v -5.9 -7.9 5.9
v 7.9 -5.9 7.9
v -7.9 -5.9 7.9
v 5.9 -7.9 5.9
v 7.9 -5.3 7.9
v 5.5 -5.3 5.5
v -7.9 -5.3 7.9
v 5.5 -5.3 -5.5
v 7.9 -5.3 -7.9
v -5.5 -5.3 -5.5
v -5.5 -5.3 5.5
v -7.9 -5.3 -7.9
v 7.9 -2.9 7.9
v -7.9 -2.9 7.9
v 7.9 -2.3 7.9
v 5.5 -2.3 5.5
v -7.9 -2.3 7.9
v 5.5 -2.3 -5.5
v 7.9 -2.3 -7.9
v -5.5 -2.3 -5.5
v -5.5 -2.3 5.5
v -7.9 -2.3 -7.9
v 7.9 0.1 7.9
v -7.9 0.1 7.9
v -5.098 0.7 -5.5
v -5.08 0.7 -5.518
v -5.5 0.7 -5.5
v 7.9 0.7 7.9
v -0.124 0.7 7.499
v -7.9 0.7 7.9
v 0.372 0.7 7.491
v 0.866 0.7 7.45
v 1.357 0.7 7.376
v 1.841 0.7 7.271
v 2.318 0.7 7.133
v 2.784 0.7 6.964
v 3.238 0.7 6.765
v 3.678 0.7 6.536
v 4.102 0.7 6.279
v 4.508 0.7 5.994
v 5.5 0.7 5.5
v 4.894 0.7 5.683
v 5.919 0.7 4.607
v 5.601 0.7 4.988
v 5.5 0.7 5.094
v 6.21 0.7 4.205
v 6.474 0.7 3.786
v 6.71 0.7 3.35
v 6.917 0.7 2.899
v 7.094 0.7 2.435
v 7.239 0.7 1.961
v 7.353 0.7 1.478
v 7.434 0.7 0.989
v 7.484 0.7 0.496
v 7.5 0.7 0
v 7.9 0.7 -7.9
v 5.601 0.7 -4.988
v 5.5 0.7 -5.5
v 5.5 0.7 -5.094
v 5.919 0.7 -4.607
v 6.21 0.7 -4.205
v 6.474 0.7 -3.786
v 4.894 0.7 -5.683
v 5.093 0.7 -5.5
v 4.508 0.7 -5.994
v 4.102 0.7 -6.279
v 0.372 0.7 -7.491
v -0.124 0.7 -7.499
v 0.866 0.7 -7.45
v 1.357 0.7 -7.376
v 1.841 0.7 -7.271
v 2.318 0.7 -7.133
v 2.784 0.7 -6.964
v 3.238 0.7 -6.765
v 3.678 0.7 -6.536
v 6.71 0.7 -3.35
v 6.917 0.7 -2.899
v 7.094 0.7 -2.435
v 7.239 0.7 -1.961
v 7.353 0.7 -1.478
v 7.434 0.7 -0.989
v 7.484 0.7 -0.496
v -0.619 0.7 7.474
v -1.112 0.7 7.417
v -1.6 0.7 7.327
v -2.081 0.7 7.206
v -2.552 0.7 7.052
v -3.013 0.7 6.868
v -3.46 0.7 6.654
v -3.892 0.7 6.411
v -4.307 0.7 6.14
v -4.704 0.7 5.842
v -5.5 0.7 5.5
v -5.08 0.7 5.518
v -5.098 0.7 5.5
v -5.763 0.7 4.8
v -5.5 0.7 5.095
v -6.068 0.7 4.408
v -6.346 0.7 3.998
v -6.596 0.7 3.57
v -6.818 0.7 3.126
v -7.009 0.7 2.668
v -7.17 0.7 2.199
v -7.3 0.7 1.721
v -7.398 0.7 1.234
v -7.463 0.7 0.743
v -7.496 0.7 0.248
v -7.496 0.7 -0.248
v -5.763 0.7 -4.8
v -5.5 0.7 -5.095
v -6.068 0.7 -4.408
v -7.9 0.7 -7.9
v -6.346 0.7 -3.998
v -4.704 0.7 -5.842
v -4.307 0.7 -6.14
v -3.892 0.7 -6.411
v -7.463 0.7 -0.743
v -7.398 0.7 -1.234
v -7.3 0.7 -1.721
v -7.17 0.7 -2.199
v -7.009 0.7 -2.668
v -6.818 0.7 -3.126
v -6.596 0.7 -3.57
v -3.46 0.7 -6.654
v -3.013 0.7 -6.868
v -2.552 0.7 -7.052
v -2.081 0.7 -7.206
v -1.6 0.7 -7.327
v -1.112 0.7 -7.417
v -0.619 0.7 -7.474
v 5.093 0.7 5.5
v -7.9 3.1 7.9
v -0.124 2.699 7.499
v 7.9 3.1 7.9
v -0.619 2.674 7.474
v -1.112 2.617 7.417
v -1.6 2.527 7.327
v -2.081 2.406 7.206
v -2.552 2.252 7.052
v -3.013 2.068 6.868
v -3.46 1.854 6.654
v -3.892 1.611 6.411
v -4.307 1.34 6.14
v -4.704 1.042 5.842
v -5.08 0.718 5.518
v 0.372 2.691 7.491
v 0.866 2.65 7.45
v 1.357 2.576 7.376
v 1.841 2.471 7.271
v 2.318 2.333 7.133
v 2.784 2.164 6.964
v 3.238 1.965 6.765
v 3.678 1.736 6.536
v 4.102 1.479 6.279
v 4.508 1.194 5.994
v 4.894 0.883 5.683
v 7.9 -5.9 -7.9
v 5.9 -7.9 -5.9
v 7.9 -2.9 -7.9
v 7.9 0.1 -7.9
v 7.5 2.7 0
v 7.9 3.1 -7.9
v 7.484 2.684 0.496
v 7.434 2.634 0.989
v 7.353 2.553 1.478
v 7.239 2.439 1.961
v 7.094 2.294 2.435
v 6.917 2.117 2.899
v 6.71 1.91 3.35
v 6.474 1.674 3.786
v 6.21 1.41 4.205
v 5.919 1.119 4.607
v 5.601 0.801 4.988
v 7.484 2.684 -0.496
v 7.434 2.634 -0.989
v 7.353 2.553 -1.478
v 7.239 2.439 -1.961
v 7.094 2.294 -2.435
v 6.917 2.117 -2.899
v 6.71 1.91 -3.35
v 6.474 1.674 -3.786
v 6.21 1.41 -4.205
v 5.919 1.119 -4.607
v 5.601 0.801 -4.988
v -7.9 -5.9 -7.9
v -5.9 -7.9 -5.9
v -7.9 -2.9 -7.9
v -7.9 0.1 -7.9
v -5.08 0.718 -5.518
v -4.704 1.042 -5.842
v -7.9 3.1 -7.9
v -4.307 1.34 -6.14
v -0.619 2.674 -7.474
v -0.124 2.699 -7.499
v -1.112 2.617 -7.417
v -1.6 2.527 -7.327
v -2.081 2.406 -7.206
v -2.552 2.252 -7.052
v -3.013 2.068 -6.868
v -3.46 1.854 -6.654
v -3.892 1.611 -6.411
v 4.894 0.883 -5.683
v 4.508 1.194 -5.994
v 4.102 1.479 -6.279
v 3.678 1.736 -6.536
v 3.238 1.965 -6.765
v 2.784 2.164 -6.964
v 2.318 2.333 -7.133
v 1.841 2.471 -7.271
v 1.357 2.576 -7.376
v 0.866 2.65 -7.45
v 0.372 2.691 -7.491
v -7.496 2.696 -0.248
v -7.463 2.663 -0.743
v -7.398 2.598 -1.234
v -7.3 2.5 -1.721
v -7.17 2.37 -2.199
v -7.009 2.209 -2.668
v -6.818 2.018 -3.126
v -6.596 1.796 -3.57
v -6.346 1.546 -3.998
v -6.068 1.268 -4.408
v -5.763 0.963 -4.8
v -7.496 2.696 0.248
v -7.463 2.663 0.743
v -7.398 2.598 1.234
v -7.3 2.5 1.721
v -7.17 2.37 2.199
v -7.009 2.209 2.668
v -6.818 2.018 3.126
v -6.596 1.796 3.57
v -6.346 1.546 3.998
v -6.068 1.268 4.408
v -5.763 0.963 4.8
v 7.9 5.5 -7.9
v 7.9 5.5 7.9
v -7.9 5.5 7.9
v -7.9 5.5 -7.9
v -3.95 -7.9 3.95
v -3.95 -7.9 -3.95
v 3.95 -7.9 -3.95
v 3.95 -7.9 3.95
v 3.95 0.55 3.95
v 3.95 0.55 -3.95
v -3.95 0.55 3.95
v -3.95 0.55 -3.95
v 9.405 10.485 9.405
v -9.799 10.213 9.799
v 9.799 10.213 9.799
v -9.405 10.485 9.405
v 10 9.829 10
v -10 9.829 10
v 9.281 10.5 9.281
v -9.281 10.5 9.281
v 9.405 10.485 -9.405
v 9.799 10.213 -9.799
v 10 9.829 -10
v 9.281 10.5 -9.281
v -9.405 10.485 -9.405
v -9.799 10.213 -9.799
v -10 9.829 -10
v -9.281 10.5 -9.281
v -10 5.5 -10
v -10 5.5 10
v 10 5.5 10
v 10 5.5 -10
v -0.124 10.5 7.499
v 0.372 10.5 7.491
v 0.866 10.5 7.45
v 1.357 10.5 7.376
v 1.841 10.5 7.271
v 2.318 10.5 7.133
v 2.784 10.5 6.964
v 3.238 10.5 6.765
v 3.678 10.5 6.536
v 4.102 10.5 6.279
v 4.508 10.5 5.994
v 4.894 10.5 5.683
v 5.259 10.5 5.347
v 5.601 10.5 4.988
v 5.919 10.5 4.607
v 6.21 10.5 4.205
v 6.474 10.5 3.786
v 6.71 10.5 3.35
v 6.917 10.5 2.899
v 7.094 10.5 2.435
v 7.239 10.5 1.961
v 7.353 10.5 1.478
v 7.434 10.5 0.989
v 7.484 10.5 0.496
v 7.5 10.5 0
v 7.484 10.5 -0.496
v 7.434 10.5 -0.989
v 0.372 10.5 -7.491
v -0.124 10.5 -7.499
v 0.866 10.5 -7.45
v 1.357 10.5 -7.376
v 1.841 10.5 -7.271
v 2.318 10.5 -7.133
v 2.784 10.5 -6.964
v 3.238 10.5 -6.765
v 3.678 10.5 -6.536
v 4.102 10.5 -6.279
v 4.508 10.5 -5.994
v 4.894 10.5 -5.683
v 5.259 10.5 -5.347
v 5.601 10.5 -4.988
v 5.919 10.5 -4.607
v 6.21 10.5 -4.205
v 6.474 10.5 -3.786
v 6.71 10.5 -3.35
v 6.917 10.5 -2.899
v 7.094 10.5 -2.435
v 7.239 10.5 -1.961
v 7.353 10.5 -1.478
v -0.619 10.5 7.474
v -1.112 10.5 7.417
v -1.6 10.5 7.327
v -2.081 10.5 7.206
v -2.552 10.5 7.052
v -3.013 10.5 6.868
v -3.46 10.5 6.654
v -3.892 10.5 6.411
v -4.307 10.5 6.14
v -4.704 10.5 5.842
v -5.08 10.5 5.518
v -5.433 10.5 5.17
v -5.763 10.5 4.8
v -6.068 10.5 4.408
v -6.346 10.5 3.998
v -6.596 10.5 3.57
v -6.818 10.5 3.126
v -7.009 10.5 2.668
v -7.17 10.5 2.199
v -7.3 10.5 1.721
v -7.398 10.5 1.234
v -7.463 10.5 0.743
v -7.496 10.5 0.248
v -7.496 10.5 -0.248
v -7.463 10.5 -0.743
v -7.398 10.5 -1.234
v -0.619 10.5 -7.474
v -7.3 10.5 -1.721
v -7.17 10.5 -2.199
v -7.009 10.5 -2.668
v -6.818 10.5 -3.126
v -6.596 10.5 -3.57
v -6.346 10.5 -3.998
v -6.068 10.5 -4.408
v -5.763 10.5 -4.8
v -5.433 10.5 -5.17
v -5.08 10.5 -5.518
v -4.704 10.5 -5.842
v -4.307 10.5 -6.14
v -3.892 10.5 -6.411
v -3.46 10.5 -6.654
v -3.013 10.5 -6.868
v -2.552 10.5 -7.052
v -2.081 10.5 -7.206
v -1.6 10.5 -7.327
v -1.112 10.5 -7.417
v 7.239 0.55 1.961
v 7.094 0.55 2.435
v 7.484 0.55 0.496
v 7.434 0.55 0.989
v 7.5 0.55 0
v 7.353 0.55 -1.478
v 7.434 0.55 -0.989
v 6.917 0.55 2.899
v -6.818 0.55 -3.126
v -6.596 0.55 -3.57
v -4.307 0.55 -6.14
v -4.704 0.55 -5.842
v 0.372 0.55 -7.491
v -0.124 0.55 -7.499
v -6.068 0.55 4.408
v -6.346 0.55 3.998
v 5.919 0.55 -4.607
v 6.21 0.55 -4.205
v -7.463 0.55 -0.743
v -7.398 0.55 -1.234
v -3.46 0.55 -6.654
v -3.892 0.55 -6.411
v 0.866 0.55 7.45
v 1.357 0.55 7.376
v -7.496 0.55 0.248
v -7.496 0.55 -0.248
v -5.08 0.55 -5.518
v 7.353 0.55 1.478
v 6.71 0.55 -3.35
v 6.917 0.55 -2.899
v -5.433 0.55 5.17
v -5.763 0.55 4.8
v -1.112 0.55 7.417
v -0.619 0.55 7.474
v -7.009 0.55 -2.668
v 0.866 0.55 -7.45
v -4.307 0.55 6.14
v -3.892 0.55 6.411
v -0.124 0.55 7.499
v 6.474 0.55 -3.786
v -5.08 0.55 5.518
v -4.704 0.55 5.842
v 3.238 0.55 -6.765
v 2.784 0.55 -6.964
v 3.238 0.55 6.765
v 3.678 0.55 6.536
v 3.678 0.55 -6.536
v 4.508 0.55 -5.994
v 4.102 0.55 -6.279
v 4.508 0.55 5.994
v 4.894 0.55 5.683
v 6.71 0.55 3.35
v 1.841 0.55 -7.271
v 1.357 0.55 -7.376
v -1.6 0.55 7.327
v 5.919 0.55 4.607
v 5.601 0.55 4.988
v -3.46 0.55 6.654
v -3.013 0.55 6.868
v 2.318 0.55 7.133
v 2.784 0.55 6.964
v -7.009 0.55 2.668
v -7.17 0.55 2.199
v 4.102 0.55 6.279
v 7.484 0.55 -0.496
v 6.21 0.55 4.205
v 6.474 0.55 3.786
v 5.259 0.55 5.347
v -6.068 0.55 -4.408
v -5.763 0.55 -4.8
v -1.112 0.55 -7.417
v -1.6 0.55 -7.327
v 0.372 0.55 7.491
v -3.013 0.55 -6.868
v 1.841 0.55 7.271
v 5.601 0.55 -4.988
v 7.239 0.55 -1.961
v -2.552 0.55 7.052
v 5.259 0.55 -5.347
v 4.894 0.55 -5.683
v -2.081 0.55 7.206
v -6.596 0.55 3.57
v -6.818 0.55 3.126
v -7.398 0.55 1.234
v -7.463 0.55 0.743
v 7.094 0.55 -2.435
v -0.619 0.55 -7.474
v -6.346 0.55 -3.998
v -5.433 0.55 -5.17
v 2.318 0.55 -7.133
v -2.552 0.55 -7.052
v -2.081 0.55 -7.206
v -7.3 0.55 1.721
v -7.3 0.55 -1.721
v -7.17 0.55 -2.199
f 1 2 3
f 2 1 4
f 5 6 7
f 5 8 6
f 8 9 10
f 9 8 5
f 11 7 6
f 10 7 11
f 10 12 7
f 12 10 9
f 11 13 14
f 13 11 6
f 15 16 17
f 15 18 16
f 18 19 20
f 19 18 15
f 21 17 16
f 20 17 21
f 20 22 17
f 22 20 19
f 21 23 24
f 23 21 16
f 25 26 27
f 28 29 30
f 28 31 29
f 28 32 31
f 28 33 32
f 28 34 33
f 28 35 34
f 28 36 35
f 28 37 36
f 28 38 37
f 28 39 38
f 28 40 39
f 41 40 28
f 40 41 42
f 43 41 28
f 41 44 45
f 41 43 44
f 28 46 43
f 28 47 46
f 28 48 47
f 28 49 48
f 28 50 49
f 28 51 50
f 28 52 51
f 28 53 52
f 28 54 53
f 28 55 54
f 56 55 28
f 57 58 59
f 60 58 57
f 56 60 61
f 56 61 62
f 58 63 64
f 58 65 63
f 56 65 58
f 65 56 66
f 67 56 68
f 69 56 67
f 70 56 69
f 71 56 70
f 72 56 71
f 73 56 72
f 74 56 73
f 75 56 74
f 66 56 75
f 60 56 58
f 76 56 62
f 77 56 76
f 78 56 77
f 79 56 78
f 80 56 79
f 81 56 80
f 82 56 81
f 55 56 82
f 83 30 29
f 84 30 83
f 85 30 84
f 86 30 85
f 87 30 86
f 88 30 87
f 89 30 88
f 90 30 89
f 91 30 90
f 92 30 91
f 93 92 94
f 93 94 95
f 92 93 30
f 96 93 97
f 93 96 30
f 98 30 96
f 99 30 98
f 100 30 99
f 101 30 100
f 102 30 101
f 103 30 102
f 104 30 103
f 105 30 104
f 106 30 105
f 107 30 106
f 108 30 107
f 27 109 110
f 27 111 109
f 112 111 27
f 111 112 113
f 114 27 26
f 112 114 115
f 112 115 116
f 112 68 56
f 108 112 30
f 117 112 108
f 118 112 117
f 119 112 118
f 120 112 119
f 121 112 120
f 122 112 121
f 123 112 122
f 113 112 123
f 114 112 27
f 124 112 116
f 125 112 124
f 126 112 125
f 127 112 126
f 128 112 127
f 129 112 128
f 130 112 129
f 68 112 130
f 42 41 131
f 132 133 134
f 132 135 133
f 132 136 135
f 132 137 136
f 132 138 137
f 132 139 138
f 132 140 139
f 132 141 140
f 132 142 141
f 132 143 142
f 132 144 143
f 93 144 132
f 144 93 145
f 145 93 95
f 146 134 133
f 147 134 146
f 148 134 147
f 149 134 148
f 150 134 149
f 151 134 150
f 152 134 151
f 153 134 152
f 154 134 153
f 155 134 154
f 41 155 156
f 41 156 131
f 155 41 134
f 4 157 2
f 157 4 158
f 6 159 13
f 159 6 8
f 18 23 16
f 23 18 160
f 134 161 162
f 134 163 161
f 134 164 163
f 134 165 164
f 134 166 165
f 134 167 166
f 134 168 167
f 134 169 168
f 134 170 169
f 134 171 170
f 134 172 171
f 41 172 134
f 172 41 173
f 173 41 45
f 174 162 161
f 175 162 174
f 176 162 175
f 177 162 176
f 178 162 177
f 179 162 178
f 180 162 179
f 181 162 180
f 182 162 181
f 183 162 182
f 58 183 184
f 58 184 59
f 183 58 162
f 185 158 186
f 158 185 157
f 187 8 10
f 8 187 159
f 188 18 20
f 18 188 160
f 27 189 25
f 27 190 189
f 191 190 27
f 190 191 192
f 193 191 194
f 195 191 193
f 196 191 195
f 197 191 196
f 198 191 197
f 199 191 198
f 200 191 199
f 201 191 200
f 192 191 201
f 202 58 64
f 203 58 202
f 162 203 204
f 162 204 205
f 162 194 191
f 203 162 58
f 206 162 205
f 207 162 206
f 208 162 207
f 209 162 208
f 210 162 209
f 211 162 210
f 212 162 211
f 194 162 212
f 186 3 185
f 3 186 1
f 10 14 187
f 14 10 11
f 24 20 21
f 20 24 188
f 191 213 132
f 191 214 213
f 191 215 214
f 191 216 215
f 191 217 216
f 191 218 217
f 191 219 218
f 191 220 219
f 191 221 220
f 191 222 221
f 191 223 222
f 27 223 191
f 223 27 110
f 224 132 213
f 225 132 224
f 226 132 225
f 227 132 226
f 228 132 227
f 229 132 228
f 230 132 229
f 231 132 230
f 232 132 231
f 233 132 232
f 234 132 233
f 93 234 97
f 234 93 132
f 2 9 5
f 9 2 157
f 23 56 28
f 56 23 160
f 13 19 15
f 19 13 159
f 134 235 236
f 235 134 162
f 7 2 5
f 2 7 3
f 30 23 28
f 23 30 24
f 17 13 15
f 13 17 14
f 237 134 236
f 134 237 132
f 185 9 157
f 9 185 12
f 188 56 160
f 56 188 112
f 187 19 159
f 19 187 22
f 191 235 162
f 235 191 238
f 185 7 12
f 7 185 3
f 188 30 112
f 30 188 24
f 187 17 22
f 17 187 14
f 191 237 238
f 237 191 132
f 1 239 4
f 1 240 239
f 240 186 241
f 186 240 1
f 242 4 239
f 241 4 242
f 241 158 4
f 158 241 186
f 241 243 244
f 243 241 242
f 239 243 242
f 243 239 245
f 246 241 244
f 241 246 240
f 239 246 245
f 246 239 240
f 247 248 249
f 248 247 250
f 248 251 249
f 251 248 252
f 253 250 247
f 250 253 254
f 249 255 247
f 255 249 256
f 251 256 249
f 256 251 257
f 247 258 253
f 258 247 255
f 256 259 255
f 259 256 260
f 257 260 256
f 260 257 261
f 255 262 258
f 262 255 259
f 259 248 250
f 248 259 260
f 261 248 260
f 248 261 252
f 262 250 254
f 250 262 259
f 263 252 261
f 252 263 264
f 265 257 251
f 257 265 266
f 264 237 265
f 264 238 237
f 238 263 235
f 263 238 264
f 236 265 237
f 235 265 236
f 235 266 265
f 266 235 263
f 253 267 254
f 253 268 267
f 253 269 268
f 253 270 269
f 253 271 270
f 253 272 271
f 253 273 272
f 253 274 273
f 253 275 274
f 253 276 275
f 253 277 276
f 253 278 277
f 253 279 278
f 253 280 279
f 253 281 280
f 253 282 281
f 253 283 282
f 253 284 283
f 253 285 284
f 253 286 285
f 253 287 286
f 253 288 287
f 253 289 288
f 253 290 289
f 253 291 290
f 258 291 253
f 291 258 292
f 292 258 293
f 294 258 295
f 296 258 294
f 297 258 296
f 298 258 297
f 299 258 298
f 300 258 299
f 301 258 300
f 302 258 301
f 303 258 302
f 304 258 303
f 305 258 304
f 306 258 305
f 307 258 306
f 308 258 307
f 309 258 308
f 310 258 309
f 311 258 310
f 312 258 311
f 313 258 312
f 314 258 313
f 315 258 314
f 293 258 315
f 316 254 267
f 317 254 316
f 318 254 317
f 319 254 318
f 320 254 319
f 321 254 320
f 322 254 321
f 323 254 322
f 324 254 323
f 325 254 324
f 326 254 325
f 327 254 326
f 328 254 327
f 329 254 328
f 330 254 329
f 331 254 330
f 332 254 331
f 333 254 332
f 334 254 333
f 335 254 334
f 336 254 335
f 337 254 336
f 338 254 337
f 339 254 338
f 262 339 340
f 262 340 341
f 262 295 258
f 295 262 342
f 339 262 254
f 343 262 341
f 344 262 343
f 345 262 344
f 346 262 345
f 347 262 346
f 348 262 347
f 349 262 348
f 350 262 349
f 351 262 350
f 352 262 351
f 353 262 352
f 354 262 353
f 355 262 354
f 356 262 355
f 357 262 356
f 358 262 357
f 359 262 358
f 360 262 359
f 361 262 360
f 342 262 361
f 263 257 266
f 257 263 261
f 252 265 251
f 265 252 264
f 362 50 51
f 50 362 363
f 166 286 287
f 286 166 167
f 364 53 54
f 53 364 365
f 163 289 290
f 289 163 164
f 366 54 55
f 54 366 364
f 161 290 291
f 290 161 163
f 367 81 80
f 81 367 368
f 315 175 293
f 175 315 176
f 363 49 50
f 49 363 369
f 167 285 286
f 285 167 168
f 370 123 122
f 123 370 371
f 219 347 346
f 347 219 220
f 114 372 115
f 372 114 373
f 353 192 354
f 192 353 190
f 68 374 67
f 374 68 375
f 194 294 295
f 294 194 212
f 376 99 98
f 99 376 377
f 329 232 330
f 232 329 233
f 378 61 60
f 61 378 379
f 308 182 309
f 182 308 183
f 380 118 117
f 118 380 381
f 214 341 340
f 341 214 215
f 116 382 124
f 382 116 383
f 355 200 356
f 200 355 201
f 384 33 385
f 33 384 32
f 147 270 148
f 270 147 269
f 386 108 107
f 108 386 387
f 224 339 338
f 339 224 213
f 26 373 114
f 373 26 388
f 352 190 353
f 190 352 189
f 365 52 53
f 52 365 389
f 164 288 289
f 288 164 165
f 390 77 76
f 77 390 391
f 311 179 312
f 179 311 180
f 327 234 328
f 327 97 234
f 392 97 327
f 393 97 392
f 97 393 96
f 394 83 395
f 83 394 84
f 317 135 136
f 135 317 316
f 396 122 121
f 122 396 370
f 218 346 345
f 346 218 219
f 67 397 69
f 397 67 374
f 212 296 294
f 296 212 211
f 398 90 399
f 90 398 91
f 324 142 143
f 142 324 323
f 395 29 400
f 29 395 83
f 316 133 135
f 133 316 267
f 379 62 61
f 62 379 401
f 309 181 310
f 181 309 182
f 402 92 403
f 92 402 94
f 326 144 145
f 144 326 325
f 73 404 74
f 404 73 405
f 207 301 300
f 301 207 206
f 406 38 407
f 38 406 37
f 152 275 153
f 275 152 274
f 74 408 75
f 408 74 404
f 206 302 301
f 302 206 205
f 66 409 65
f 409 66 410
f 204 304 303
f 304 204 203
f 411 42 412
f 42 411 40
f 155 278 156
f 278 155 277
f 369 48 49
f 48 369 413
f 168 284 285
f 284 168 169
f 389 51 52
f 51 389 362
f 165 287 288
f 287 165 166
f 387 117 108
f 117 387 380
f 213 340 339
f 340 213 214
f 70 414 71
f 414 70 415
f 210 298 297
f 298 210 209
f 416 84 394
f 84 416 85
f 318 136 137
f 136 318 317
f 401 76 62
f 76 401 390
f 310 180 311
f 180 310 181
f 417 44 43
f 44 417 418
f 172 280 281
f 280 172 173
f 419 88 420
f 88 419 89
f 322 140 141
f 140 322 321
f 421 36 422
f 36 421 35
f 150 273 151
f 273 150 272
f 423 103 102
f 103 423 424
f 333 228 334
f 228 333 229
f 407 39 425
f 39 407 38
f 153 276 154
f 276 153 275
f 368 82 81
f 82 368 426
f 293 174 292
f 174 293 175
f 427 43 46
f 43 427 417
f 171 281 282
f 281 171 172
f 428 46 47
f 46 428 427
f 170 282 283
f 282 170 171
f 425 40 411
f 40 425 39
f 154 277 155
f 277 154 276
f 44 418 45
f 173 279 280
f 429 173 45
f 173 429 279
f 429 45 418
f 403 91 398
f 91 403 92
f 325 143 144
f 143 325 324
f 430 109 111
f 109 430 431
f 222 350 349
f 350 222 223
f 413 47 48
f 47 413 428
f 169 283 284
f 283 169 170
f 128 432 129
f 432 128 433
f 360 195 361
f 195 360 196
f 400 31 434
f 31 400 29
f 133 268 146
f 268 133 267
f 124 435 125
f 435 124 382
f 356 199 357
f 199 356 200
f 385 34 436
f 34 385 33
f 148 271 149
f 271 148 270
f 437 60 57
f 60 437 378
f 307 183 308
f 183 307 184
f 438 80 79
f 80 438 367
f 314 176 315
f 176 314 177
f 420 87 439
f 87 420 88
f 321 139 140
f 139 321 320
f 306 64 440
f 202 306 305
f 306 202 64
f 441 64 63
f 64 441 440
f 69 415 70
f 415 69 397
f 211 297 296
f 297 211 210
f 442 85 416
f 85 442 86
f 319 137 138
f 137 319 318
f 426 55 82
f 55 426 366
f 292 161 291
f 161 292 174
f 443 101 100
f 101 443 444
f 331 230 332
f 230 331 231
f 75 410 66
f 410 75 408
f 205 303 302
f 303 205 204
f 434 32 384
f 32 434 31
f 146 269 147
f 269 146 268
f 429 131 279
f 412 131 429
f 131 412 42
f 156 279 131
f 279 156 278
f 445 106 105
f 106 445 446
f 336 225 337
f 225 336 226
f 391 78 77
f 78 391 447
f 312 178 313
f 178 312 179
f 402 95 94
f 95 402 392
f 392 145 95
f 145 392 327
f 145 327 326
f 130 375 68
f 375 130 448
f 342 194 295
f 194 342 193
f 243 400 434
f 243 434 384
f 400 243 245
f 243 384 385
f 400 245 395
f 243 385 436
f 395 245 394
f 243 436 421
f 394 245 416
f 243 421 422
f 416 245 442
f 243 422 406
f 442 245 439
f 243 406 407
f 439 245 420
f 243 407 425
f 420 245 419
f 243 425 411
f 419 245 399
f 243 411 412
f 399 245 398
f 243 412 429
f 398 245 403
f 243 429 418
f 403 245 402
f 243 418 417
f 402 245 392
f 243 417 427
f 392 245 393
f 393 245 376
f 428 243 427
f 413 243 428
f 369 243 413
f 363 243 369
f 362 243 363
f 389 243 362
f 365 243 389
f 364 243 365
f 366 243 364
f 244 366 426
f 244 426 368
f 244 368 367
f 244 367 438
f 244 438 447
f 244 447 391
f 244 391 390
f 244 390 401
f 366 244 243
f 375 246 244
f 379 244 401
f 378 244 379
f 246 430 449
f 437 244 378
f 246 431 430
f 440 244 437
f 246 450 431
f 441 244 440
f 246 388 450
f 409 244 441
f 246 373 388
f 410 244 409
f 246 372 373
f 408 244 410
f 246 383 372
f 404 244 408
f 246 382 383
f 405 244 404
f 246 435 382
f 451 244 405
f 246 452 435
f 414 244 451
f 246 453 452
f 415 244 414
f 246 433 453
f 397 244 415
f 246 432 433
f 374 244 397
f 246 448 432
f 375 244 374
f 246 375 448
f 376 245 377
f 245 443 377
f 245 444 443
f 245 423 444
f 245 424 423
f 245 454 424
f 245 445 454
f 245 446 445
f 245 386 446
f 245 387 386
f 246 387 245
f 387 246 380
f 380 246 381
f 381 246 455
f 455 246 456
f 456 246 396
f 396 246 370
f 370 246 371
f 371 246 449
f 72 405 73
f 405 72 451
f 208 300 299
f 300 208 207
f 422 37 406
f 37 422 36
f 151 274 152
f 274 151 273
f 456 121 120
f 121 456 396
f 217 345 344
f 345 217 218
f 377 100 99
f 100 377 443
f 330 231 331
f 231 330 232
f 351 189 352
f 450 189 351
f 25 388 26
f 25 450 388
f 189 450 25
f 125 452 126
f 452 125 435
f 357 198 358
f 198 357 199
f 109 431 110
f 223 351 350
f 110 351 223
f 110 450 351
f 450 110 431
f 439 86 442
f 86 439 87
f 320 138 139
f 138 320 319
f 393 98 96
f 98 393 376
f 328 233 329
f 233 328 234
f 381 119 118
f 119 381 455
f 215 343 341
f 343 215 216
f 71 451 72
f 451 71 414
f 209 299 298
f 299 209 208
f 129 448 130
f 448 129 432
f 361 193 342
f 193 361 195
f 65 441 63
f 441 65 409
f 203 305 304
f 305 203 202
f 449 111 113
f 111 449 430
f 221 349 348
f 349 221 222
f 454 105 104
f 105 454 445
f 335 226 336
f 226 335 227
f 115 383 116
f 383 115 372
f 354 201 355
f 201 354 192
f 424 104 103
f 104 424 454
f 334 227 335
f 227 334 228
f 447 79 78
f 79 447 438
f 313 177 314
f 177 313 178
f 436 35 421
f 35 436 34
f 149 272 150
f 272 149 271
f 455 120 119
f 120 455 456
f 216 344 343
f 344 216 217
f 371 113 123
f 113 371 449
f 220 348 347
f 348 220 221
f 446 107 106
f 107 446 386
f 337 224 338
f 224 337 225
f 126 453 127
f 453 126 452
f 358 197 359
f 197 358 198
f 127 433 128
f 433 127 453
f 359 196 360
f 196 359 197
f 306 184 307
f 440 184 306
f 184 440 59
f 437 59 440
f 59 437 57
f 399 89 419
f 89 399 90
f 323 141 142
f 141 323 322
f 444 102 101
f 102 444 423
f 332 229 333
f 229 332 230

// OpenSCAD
use <MCAD/triangles.scad>
use <MCAD/boxes.scad>

$fa=0.01;
$fs=0.5;

module bar() {
	difference() {
		cube([20,300,20],center=true);
		cube([16,310,16],center=true);	
	}
}

module notches() {
	for(i=[0:3]) {
		rotate([0,i*90,0]) {
			for(d=[-8.3,-5.3,-2.3,0.7]) {
				translate([-8,d,8.5])
				rotate([0,90,0])
				triangle(3,3,16);
			}
			
			translate([0,-2.1,8.5])
			cube([16,12,1],center=true);
		}
	}
}

module roundedEdge() {
		difference() {
		translate([0,0.5,0.5])
		cube([22,1,1],center=true);
		rotate([0,90,0]) 
		cylinder(r=1,h=23,center=true);
		}
}

module roundEdges() {
	for(i=[0:3]) {
		rotate([0,i*90,0]) {
			translate([0,9.55,9.05])
			roundedEdge();
		}
	}
}

module channel() {
	difference() {
		intersection() {
			rotate([90,0,0])
			cylinder(r=8,h=5,center=true);
			
			translate([5,0,5])
			cube([10,5,10],center=true);
		}
		
		rotate([90,0,0])
		cylinder(r=6,h=6,center=true);
	}
	
	translate([0,1.5,0])
	difference() {
		intersection() {
			rotate([90,0,0])
			cylinder(r=9,h=2,center=true);
			
			translate([5,0,5])
			cube([10,5,10],center=true);
		}
		
		rotate([90,0,0])
		cylinder(r=5,h=3.5,center=true);
	}
	
	translate([0,0,7])
	rotate([90,0,0])
	cylinder(r=2,h=5,center=true);
}

module connector() {
	difference() {
		cube(15.8,center=true);
		scale([0.5,1.5,0.5])
		cube(15.8,center=true);
		notches();
	}

	difference() {
		translate([0,8,0])
		rotate([90,0,0])
		cube([20,20,5],center=true);

		roundEdges();
	}
	

}

module maleConnector() {
	difference() {
		union() {
			connector();
		
			translate([0,13,0])	
			rotate([90,0,0])
			cylinder(r=2.5,h=5,center=false);	
		}
		translate([0,9,0])
		rotate([0,90,180])
		channel();
	}

	translate([7,12.95,0])
	peg();
}

module femaleConnector() {
	difference() {
		difference() {
			connector();
			
			translate([0,13,0])	
			rotate([90,0,0])
			scale([1.02,1.02,1])
			cylinder(r=2.5,h=5,center=false);	
		}
		
		translate([0,9,0])
		rotate([0,90,180])
		mirror([1,0,0])
		channel();
	}

	translate([7,12.95,0])
	peg();
}

module peg() {

	rotate([90,0,0])
	cylinder(r=1,h=5,center=true);
	
	translate([0,1.5,0])
	rotate([90,0,0])
	cylinder(r=2,h=2,center=true);
}

//peg();

//bar();

//channel();

//connector();

//translate([0,-20,0])
//maleConnector();

//translate([0,20,0])
//rotate([0,0,180])
//femaleConnector();

module magnet() {
	rotate([90,0,0])
	color("gold")
	cylinder(r=7.5,h=5,center=true);
}

module magnetMaleConnector() {
	connector();
	
//	translate([0,10.5,0])

}

module magnetFemaleConnector() {
	difference() {
		connector();
		
		translate([0,5.6,0])
		rotate([90,0,0])
		cylinder(r=7.5,h=10.1,center=true);
	}
}

//magnetMaleConnector();
magnetFemaleConnector();
